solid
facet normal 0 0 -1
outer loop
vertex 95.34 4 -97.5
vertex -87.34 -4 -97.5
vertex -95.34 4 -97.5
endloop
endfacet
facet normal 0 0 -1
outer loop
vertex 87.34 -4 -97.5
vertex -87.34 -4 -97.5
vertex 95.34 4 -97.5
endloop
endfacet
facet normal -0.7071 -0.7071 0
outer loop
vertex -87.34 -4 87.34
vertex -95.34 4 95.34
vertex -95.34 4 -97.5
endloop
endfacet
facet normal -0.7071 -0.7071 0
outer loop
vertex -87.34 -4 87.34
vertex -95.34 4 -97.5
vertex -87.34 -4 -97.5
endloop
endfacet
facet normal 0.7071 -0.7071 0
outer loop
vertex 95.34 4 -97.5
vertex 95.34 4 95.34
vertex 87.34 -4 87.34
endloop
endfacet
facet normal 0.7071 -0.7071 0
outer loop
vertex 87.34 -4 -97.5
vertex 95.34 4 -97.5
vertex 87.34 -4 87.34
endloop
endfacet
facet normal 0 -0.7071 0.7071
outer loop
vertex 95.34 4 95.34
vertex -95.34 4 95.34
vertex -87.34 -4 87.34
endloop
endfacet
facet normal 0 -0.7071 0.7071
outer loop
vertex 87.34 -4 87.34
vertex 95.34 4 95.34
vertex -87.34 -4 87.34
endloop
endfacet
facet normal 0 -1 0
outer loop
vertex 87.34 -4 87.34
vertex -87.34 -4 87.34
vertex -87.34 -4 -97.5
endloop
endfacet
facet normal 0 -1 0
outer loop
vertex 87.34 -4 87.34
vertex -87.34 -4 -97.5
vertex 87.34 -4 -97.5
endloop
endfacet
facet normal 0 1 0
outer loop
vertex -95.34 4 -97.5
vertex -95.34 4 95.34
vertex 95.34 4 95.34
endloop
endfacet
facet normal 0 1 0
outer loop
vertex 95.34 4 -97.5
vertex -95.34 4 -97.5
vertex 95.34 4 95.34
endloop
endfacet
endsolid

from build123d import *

# Parameters (mm, degrees)
F0_W        = 195
F0_H        = 195
F1_DEPTH    = 4.0000047
F2_T1_DEPTH = 247.2565983155
F3_T1_DEPTH = 247.2565983155
F4_T1_DEPTH = 226.9365983155


# Not quite as in the source:
# - a fillet or chamfer that OpenCascade refuses, or shapes differently, is made with other operations: its cross-section is extruded or revolved along the edge and cut away or added


with BuildPart() as f1:
    # F0 (on Front) → F1 (new body, symmetric)
    with BuildSketch(Plane.XZ):
        Rectangle(F0_W, F0_H)
    extrude(amount=F1_DEPTH, both=True)

    # F2: chamfer of 10.16 on 1 edges, made by hand

    # F2_s2 → F2_t1 (cut)
    with BuildSketch(Plane.XY.offset(-123.6282991577)):
        Polygon((97.5, 6.1599953), (87.34, -4.0000047), (97.5, -4.0000047), align=None)
    extrude(amount=F2_T1_DEPTH, mode=Mode.SUBTRACT)

    # F3: chamfer of 10.16 on 1 edges, made by hand

    # F3_s2 → F3_t1 (cut)
    with BuildSketch(Plane.XY.offset(-123.6282991577)):
        Polygon((-97.5, 6.1599953), (-87.34, -4.0000047), (-97.5, -4.0000047), align=None)
    extrude(amount=F3_T1_DEPTH, mode=Mode.SUBTRACT)

    # F4: chamfer of 10.16 on 1 edges, made by hand

    # F4_s2 → F4_t1 (cut)
    with BuildSketch(Plane.YZ.offset(-113.4682991577)):
        Polygon((6.1599953, 97.5), (-4.0000047, 87.34), (-4.0000047, 97.5), align=None)
    extrude(amount=F4_T1_DEPTH, mode=Mode.SUBTRACT)


solid = f1.part
